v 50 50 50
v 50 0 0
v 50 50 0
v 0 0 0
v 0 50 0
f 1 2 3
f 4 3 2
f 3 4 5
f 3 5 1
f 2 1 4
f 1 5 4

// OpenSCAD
difference ()
{
    cube (50);
    rotate (-45, [1, 0, 0])
        translate ([0, -50, 0])
            cube ([75, 50, 75]);
    rotate (45, [0, 1, 0])
        translate ([-50, 0, 0])
            cube ([50, 75, 75]);
}
